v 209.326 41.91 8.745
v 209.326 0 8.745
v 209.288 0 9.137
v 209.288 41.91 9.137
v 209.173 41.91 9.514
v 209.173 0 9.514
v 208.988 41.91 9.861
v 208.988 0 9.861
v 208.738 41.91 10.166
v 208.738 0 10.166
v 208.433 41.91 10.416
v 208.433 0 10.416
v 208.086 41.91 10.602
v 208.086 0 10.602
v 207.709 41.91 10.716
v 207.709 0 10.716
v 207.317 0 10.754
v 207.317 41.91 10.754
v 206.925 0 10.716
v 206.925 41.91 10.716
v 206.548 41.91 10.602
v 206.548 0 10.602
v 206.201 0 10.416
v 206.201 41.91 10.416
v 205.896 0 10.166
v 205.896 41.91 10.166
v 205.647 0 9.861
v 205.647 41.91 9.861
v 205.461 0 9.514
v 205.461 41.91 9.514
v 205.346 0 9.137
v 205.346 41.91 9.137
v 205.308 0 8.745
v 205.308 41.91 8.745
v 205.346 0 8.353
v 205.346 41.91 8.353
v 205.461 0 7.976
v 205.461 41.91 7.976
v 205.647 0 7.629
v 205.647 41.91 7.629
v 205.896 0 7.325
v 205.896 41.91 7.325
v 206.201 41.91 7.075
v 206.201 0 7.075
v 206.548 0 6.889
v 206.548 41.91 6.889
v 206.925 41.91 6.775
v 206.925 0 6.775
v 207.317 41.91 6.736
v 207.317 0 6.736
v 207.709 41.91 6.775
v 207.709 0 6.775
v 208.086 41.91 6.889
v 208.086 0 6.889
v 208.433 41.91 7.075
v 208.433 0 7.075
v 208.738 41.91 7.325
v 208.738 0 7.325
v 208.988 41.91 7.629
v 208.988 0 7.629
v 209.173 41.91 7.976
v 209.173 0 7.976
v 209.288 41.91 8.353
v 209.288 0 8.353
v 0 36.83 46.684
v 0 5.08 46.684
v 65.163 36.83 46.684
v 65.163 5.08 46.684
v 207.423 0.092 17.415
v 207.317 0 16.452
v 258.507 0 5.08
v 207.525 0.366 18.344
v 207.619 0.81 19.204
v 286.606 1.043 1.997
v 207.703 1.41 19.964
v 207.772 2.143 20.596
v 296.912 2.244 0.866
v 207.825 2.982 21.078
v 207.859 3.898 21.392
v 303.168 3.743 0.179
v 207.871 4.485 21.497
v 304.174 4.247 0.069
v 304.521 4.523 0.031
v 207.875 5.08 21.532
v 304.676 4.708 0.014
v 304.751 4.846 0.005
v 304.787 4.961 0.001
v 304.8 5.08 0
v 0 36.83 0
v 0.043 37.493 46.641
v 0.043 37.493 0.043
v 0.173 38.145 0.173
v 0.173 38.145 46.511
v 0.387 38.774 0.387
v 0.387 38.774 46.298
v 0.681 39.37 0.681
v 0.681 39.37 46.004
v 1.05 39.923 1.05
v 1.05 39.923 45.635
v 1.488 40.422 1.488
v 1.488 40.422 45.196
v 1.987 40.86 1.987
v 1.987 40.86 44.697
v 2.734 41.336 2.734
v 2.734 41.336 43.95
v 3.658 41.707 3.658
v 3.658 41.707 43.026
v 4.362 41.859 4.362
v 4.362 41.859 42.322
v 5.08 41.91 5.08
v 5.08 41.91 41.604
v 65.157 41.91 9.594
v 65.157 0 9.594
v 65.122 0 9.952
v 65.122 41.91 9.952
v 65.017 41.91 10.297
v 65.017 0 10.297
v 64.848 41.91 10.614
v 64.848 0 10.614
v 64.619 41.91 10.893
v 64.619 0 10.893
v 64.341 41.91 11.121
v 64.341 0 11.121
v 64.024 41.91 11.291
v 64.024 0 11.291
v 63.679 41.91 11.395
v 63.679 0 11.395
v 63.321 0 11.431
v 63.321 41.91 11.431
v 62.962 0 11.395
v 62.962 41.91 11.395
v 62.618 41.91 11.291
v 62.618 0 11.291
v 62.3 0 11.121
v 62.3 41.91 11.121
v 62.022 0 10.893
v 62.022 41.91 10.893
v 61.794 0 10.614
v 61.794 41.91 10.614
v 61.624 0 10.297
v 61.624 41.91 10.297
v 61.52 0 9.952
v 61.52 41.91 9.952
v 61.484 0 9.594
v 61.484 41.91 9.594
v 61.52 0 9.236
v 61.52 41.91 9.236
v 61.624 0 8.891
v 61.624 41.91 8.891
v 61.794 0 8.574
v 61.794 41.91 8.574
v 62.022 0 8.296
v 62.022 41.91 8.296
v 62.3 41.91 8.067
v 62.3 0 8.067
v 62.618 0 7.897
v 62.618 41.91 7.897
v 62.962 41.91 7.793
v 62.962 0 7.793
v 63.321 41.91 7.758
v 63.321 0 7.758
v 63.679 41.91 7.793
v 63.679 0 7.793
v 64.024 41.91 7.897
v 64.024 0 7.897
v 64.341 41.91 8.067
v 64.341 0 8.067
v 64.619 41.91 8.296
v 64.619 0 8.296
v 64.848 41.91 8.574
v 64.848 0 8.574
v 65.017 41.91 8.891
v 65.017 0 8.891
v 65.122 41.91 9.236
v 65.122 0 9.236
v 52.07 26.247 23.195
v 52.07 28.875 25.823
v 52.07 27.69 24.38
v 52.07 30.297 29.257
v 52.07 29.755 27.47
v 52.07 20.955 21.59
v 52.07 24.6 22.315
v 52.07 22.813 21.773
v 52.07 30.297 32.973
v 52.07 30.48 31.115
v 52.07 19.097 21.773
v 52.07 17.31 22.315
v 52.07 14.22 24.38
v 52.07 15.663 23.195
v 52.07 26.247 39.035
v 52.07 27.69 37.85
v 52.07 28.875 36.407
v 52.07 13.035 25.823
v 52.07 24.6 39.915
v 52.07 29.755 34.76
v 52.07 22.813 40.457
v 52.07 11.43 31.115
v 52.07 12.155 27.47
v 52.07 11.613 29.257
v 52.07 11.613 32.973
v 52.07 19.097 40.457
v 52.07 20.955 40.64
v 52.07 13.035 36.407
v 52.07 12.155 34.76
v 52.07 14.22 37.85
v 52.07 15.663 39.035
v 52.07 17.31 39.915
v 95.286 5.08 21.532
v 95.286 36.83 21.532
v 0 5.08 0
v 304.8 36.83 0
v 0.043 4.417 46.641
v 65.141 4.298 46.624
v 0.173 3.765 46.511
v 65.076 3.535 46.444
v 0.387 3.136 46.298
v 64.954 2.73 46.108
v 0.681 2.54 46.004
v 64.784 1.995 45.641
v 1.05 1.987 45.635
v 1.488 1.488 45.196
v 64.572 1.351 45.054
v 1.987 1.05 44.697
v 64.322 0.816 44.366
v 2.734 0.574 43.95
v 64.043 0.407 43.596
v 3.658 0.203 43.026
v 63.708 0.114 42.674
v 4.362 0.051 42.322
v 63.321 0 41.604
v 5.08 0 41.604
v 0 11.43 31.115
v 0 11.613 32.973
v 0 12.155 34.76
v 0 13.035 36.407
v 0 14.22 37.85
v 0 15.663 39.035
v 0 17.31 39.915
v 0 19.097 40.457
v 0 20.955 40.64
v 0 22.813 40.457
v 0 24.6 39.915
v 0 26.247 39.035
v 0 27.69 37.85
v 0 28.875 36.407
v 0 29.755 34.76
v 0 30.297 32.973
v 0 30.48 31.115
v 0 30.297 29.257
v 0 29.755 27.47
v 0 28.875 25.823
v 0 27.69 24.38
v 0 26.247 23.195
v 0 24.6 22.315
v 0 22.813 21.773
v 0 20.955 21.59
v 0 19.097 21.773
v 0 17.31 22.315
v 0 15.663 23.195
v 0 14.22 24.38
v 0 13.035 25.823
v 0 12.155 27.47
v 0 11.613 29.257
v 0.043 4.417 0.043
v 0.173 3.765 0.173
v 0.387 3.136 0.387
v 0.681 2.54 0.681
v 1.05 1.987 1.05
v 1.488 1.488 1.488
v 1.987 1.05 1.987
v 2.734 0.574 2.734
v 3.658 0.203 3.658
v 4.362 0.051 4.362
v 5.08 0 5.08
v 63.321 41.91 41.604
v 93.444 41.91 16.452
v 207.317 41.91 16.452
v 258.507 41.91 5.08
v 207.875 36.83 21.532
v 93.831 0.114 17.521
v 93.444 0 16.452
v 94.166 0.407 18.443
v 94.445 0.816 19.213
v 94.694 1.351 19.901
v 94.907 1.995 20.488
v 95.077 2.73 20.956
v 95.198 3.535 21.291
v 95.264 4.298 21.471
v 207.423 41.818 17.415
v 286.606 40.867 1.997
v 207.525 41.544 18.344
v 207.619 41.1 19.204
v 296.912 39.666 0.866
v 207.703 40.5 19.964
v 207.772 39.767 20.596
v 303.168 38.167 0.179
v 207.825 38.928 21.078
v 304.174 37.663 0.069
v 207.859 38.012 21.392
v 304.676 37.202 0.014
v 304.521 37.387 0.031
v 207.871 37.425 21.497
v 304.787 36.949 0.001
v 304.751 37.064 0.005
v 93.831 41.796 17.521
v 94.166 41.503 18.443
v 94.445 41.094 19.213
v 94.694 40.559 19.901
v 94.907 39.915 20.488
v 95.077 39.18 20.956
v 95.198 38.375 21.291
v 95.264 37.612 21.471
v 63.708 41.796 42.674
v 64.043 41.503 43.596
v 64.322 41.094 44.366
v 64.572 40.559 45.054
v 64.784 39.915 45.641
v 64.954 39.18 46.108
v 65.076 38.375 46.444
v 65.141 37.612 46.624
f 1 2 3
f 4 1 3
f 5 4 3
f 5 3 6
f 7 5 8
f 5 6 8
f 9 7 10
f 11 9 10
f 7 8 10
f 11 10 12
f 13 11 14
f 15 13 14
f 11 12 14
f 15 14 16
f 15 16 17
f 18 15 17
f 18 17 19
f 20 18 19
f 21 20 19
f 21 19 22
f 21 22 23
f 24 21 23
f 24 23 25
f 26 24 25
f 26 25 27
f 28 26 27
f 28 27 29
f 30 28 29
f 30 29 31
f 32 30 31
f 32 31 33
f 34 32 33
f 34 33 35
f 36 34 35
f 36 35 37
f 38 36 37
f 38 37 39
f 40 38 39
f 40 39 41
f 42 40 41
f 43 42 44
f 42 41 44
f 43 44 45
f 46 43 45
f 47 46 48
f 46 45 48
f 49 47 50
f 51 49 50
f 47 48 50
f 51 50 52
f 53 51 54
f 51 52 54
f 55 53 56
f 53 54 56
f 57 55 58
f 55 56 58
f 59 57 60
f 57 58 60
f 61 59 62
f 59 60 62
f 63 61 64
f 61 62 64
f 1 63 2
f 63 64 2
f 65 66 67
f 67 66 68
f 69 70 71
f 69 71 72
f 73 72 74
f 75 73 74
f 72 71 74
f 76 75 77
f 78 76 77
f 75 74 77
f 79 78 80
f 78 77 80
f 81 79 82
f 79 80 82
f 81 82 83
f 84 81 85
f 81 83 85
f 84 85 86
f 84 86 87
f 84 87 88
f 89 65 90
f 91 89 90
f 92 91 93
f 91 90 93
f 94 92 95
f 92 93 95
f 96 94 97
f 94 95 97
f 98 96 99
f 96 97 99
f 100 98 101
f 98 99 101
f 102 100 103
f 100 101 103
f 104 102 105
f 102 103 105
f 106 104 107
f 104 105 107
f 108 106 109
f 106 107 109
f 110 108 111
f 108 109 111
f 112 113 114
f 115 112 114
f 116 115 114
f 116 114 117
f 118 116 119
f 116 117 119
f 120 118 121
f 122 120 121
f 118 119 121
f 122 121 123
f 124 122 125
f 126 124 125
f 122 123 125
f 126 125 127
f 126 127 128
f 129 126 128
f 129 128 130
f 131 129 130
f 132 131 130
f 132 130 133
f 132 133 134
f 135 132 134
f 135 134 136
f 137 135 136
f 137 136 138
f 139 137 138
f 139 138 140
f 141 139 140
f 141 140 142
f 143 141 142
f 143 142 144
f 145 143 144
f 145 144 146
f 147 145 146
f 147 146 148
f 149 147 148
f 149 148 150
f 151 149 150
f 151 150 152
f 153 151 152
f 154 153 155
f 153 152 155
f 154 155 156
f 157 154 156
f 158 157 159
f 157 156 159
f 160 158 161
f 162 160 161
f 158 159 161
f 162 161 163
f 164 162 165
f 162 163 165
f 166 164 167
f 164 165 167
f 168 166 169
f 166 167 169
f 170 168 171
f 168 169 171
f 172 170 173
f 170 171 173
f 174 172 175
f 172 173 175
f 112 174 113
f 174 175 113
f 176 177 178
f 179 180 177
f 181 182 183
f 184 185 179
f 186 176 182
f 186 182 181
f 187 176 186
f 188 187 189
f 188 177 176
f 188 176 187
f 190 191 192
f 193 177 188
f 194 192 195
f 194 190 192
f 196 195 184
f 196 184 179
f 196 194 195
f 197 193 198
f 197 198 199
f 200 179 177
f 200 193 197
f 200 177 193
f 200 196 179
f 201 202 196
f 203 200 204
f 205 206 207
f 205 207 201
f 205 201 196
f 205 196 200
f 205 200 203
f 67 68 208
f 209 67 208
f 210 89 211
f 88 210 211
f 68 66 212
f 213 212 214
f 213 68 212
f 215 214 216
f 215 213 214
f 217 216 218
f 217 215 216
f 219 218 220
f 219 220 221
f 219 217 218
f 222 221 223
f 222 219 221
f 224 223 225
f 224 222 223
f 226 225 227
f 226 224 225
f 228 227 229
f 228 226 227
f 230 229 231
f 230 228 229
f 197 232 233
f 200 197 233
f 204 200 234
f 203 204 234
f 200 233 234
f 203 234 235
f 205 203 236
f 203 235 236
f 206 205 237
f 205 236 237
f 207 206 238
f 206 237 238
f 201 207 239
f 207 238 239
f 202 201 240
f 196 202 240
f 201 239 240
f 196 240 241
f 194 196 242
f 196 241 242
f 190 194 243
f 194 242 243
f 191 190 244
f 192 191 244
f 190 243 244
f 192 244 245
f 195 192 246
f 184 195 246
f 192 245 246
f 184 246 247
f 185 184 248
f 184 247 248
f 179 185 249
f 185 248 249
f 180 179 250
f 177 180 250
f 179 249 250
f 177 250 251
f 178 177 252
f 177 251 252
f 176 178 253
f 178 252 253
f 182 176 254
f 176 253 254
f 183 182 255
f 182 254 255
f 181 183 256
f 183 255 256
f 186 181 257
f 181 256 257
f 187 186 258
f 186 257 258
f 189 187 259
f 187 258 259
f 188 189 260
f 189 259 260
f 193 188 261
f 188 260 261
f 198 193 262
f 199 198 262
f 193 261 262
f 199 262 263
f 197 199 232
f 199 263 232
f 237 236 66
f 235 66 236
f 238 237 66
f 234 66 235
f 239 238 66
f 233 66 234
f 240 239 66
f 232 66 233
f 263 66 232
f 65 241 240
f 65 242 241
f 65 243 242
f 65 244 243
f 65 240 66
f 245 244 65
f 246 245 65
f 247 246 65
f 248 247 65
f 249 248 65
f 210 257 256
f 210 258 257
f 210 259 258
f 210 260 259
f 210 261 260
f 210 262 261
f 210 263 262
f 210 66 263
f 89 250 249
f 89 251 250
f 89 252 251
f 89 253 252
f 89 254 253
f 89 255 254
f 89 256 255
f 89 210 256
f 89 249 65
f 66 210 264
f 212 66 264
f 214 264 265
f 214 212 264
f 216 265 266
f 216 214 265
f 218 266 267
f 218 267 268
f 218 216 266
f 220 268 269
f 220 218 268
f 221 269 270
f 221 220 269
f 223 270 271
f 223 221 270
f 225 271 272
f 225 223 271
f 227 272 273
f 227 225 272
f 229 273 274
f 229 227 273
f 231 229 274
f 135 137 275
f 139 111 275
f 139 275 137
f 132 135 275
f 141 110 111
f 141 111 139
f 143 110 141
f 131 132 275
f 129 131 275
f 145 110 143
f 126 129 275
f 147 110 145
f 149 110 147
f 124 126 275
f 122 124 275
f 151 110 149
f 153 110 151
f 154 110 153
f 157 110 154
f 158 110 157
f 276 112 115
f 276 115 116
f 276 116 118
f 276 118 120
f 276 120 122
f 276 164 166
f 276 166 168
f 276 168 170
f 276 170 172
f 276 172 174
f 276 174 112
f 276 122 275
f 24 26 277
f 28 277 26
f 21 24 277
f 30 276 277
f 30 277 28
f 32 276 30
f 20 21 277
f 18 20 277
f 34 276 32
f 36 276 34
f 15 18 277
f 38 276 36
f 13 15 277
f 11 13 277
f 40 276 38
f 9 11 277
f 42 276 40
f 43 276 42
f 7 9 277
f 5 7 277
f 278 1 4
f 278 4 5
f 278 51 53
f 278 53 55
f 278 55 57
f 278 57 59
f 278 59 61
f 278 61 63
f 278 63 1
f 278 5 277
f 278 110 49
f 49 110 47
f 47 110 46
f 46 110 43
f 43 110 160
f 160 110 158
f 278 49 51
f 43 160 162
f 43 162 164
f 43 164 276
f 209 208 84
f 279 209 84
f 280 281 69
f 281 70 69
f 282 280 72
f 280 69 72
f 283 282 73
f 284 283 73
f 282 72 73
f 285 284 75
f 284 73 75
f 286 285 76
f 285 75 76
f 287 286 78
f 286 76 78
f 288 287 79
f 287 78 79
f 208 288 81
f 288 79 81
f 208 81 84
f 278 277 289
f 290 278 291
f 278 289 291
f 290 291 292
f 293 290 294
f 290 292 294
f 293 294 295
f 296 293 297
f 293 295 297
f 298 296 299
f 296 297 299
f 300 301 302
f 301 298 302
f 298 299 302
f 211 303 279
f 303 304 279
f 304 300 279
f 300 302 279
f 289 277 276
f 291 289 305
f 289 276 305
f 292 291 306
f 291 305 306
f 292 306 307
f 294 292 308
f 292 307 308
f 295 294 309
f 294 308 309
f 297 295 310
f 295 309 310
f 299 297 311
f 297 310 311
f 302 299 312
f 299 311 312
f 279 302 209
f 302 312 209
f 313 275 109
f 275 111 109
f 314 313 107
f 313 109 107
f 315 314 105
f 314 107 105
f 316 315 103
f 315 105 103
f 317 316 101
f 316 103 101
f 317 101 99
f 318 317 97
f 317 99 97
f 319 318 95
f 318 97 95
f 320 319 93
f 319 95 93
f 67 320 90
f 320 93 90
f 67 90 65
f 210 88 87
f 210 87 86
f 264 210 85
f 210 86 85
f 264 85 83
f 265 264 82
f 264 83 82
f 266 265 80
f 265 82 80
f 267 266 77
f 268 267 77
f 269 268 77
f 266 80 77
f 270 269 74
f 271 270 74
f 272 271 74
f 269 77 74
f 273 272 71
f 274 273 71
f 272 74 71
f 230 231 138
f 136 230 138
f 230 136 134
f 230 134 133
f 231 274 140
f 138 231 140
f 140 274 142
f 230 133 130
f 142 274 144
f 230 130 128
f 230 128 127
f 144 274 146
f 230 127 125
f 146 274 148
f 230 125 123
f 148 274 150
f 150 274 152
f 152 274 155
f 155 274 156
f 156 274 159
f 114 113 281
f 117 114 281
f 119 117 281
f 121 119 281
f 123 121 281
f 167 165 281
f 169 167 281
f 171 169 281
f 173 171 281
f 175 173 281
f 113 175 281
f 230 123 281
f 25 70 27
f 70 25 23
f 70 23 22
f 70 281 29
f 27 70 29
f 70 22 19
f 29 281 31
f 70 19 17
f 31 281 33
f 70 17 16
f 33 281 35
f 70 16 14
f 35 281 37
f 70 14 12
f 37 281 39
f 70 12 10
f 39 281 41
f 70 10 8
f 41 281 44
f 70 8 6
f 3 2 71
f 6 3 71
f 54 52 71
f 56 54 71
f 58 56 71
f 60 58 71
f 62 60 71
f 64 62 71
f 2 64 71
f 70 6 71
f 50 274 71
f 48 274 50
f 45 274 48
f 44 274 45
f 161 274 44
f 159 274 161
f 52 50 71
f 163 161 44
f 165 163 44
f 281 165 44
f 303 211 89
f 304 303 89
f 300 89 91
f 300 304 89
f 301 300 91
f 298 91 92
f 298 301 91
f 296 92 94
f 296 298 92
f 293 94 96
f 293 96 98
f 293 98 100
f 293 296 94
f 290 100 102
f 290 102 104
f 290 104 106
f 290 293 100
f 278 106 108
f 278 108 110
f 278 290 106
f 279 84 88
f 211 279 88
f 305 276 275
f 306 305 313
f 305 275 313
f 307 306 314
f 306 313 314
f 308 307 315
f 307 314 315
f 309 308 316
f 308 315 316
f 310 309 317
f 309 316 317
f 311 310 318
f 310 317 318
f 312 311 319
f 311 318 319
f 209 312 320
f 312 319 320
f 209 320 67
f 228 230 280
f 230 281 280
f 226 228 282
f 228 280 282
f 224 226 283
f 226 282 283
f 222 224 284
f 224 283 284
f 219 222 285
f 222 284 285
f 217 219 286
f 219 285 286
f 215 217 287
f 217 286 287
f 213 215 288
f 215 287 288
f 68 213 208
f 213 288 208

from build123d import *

# Parameters (mm, degrees)
F0_W      = 304.8
F0_H      = 41.91
F1_DEPTH  = 72.39
F3_DEPTH  = 44.45
F4_R      = 9.525
F5_DEPTH  = 52.07
F7_DEPTH  = 42.164
F9_DEPTH  = 43.18
F10_R     = 5.08
F11_R     = 5.08
F12_R     = 1.8364316327
F13_DEPTH = 50.8
F14_R     = 2.0092193571
F15_DEPTH = 50.8


with BuildPart() as f1:
    # F0 (on Top) → F1 (new body)
    with BuildSketch(Plane.XY):
        with Locations((152.4, 20.955)):
            Rectangle(F0_W, F0_H)
    extrude(amount=F1_DEPTH)

    # F2 (on face) → F3 (cut)
    with BuildSketch(Plane.XZ):
        Polygon((304.8, 72.39), (0, 72.39), (304.8, 19.05), align=None)
    extrude(amount=-F3_DEPTH, mode=Mode.SUBTRACT)

    # F4 (on face) → F5 (cut)
    with BuildSketch(Plane(origin=(0, 0, 0), x_dir=(0, -1, 0), z_dir=(-1, 0, 0))):
        with Locations((-20.955, 31.115)):
            Circle(F4_R)
    extrude(amount=-F5_DEPTH, mode=Mode.SUBTRACT)

    # F6 (on face) → F7 (cut)
    with BuildSketch(Plane.XZ):
        Polygon((0, 72.39), (0, 53.7492334843), (68.9350515604, 53.7492334843), (95.2856466174, 29.7941416502), (207.8745663166, 29.7941416502), (304.8, 0), (304.8, 19.05), align=None)
    extrude(amount=-F7_DEPTH, mode=Mode.SUBTRACT)

    # F8 (on face) → F9 (cut)
    with BuildSketch(Plane.XZ):
        Polygon((0, 53.7492334843), (0, 46.6843768954), (65.1628002524, 46.6843768954), (95.2856466174, 21.5315297246), (207.8745663166, 21.5315297246), (304.8, 0), (207.8745663166, 29.7941416502), (95.2856466174, 29.7941416502), (68.9350515604, 53.7492334843), align=None)
    extrude(amount=-F9_DEPTH, mode=Mode.SUBTRACT)

    # F10
    f10_edges = [f1.edges().sort_by_distance(p)[0] for p in [
        (152.4, 0, 0),
        (256.337283, 0, 10.765765),
        (151.580106, 0, 21.53153),
        (80.224223, 0, 34.107953),
        (32.5814, 0, 46.684377),
        (0, 0, 23.342188),
    ]]
    fillet(f10_edges, radius=F10_R)

    # F11
    f11_edges = [f1.edges().sort_by_distance(p)[0] for p in [
        (152.4, 41.91, 0),
        (0, 41.91, 23.342188),
        (32.5814, 41.91, 46.684377),
        (80.224223, 41.91, 34.107953),
        (151.580106, 41.91, 21.53153),
        (256.337283, 41.91, 10.765765),
    ]]
    fillet(f11_edges, radius=F11_R)

    # F12 (on face) → F13 (cut)
    with BuildSketch(Plane.XZ):
        with Locations((63.3207473448, 9.5940940082)):
            Circle(F12_R)
    extrude(amount=-F13_DEPTH, mode=Mode.SUBTRACT)

    # F14 (on face) → F15 (cut)
    with BuildSketch(Plane.XZ):
        with Locations((207.3171118243, 8.7452335283)):
            Circle(F14_R)
    extrude(amount=-F15_DEPTH, mode=Mode.SUBTRACT)


solid = f1.part
